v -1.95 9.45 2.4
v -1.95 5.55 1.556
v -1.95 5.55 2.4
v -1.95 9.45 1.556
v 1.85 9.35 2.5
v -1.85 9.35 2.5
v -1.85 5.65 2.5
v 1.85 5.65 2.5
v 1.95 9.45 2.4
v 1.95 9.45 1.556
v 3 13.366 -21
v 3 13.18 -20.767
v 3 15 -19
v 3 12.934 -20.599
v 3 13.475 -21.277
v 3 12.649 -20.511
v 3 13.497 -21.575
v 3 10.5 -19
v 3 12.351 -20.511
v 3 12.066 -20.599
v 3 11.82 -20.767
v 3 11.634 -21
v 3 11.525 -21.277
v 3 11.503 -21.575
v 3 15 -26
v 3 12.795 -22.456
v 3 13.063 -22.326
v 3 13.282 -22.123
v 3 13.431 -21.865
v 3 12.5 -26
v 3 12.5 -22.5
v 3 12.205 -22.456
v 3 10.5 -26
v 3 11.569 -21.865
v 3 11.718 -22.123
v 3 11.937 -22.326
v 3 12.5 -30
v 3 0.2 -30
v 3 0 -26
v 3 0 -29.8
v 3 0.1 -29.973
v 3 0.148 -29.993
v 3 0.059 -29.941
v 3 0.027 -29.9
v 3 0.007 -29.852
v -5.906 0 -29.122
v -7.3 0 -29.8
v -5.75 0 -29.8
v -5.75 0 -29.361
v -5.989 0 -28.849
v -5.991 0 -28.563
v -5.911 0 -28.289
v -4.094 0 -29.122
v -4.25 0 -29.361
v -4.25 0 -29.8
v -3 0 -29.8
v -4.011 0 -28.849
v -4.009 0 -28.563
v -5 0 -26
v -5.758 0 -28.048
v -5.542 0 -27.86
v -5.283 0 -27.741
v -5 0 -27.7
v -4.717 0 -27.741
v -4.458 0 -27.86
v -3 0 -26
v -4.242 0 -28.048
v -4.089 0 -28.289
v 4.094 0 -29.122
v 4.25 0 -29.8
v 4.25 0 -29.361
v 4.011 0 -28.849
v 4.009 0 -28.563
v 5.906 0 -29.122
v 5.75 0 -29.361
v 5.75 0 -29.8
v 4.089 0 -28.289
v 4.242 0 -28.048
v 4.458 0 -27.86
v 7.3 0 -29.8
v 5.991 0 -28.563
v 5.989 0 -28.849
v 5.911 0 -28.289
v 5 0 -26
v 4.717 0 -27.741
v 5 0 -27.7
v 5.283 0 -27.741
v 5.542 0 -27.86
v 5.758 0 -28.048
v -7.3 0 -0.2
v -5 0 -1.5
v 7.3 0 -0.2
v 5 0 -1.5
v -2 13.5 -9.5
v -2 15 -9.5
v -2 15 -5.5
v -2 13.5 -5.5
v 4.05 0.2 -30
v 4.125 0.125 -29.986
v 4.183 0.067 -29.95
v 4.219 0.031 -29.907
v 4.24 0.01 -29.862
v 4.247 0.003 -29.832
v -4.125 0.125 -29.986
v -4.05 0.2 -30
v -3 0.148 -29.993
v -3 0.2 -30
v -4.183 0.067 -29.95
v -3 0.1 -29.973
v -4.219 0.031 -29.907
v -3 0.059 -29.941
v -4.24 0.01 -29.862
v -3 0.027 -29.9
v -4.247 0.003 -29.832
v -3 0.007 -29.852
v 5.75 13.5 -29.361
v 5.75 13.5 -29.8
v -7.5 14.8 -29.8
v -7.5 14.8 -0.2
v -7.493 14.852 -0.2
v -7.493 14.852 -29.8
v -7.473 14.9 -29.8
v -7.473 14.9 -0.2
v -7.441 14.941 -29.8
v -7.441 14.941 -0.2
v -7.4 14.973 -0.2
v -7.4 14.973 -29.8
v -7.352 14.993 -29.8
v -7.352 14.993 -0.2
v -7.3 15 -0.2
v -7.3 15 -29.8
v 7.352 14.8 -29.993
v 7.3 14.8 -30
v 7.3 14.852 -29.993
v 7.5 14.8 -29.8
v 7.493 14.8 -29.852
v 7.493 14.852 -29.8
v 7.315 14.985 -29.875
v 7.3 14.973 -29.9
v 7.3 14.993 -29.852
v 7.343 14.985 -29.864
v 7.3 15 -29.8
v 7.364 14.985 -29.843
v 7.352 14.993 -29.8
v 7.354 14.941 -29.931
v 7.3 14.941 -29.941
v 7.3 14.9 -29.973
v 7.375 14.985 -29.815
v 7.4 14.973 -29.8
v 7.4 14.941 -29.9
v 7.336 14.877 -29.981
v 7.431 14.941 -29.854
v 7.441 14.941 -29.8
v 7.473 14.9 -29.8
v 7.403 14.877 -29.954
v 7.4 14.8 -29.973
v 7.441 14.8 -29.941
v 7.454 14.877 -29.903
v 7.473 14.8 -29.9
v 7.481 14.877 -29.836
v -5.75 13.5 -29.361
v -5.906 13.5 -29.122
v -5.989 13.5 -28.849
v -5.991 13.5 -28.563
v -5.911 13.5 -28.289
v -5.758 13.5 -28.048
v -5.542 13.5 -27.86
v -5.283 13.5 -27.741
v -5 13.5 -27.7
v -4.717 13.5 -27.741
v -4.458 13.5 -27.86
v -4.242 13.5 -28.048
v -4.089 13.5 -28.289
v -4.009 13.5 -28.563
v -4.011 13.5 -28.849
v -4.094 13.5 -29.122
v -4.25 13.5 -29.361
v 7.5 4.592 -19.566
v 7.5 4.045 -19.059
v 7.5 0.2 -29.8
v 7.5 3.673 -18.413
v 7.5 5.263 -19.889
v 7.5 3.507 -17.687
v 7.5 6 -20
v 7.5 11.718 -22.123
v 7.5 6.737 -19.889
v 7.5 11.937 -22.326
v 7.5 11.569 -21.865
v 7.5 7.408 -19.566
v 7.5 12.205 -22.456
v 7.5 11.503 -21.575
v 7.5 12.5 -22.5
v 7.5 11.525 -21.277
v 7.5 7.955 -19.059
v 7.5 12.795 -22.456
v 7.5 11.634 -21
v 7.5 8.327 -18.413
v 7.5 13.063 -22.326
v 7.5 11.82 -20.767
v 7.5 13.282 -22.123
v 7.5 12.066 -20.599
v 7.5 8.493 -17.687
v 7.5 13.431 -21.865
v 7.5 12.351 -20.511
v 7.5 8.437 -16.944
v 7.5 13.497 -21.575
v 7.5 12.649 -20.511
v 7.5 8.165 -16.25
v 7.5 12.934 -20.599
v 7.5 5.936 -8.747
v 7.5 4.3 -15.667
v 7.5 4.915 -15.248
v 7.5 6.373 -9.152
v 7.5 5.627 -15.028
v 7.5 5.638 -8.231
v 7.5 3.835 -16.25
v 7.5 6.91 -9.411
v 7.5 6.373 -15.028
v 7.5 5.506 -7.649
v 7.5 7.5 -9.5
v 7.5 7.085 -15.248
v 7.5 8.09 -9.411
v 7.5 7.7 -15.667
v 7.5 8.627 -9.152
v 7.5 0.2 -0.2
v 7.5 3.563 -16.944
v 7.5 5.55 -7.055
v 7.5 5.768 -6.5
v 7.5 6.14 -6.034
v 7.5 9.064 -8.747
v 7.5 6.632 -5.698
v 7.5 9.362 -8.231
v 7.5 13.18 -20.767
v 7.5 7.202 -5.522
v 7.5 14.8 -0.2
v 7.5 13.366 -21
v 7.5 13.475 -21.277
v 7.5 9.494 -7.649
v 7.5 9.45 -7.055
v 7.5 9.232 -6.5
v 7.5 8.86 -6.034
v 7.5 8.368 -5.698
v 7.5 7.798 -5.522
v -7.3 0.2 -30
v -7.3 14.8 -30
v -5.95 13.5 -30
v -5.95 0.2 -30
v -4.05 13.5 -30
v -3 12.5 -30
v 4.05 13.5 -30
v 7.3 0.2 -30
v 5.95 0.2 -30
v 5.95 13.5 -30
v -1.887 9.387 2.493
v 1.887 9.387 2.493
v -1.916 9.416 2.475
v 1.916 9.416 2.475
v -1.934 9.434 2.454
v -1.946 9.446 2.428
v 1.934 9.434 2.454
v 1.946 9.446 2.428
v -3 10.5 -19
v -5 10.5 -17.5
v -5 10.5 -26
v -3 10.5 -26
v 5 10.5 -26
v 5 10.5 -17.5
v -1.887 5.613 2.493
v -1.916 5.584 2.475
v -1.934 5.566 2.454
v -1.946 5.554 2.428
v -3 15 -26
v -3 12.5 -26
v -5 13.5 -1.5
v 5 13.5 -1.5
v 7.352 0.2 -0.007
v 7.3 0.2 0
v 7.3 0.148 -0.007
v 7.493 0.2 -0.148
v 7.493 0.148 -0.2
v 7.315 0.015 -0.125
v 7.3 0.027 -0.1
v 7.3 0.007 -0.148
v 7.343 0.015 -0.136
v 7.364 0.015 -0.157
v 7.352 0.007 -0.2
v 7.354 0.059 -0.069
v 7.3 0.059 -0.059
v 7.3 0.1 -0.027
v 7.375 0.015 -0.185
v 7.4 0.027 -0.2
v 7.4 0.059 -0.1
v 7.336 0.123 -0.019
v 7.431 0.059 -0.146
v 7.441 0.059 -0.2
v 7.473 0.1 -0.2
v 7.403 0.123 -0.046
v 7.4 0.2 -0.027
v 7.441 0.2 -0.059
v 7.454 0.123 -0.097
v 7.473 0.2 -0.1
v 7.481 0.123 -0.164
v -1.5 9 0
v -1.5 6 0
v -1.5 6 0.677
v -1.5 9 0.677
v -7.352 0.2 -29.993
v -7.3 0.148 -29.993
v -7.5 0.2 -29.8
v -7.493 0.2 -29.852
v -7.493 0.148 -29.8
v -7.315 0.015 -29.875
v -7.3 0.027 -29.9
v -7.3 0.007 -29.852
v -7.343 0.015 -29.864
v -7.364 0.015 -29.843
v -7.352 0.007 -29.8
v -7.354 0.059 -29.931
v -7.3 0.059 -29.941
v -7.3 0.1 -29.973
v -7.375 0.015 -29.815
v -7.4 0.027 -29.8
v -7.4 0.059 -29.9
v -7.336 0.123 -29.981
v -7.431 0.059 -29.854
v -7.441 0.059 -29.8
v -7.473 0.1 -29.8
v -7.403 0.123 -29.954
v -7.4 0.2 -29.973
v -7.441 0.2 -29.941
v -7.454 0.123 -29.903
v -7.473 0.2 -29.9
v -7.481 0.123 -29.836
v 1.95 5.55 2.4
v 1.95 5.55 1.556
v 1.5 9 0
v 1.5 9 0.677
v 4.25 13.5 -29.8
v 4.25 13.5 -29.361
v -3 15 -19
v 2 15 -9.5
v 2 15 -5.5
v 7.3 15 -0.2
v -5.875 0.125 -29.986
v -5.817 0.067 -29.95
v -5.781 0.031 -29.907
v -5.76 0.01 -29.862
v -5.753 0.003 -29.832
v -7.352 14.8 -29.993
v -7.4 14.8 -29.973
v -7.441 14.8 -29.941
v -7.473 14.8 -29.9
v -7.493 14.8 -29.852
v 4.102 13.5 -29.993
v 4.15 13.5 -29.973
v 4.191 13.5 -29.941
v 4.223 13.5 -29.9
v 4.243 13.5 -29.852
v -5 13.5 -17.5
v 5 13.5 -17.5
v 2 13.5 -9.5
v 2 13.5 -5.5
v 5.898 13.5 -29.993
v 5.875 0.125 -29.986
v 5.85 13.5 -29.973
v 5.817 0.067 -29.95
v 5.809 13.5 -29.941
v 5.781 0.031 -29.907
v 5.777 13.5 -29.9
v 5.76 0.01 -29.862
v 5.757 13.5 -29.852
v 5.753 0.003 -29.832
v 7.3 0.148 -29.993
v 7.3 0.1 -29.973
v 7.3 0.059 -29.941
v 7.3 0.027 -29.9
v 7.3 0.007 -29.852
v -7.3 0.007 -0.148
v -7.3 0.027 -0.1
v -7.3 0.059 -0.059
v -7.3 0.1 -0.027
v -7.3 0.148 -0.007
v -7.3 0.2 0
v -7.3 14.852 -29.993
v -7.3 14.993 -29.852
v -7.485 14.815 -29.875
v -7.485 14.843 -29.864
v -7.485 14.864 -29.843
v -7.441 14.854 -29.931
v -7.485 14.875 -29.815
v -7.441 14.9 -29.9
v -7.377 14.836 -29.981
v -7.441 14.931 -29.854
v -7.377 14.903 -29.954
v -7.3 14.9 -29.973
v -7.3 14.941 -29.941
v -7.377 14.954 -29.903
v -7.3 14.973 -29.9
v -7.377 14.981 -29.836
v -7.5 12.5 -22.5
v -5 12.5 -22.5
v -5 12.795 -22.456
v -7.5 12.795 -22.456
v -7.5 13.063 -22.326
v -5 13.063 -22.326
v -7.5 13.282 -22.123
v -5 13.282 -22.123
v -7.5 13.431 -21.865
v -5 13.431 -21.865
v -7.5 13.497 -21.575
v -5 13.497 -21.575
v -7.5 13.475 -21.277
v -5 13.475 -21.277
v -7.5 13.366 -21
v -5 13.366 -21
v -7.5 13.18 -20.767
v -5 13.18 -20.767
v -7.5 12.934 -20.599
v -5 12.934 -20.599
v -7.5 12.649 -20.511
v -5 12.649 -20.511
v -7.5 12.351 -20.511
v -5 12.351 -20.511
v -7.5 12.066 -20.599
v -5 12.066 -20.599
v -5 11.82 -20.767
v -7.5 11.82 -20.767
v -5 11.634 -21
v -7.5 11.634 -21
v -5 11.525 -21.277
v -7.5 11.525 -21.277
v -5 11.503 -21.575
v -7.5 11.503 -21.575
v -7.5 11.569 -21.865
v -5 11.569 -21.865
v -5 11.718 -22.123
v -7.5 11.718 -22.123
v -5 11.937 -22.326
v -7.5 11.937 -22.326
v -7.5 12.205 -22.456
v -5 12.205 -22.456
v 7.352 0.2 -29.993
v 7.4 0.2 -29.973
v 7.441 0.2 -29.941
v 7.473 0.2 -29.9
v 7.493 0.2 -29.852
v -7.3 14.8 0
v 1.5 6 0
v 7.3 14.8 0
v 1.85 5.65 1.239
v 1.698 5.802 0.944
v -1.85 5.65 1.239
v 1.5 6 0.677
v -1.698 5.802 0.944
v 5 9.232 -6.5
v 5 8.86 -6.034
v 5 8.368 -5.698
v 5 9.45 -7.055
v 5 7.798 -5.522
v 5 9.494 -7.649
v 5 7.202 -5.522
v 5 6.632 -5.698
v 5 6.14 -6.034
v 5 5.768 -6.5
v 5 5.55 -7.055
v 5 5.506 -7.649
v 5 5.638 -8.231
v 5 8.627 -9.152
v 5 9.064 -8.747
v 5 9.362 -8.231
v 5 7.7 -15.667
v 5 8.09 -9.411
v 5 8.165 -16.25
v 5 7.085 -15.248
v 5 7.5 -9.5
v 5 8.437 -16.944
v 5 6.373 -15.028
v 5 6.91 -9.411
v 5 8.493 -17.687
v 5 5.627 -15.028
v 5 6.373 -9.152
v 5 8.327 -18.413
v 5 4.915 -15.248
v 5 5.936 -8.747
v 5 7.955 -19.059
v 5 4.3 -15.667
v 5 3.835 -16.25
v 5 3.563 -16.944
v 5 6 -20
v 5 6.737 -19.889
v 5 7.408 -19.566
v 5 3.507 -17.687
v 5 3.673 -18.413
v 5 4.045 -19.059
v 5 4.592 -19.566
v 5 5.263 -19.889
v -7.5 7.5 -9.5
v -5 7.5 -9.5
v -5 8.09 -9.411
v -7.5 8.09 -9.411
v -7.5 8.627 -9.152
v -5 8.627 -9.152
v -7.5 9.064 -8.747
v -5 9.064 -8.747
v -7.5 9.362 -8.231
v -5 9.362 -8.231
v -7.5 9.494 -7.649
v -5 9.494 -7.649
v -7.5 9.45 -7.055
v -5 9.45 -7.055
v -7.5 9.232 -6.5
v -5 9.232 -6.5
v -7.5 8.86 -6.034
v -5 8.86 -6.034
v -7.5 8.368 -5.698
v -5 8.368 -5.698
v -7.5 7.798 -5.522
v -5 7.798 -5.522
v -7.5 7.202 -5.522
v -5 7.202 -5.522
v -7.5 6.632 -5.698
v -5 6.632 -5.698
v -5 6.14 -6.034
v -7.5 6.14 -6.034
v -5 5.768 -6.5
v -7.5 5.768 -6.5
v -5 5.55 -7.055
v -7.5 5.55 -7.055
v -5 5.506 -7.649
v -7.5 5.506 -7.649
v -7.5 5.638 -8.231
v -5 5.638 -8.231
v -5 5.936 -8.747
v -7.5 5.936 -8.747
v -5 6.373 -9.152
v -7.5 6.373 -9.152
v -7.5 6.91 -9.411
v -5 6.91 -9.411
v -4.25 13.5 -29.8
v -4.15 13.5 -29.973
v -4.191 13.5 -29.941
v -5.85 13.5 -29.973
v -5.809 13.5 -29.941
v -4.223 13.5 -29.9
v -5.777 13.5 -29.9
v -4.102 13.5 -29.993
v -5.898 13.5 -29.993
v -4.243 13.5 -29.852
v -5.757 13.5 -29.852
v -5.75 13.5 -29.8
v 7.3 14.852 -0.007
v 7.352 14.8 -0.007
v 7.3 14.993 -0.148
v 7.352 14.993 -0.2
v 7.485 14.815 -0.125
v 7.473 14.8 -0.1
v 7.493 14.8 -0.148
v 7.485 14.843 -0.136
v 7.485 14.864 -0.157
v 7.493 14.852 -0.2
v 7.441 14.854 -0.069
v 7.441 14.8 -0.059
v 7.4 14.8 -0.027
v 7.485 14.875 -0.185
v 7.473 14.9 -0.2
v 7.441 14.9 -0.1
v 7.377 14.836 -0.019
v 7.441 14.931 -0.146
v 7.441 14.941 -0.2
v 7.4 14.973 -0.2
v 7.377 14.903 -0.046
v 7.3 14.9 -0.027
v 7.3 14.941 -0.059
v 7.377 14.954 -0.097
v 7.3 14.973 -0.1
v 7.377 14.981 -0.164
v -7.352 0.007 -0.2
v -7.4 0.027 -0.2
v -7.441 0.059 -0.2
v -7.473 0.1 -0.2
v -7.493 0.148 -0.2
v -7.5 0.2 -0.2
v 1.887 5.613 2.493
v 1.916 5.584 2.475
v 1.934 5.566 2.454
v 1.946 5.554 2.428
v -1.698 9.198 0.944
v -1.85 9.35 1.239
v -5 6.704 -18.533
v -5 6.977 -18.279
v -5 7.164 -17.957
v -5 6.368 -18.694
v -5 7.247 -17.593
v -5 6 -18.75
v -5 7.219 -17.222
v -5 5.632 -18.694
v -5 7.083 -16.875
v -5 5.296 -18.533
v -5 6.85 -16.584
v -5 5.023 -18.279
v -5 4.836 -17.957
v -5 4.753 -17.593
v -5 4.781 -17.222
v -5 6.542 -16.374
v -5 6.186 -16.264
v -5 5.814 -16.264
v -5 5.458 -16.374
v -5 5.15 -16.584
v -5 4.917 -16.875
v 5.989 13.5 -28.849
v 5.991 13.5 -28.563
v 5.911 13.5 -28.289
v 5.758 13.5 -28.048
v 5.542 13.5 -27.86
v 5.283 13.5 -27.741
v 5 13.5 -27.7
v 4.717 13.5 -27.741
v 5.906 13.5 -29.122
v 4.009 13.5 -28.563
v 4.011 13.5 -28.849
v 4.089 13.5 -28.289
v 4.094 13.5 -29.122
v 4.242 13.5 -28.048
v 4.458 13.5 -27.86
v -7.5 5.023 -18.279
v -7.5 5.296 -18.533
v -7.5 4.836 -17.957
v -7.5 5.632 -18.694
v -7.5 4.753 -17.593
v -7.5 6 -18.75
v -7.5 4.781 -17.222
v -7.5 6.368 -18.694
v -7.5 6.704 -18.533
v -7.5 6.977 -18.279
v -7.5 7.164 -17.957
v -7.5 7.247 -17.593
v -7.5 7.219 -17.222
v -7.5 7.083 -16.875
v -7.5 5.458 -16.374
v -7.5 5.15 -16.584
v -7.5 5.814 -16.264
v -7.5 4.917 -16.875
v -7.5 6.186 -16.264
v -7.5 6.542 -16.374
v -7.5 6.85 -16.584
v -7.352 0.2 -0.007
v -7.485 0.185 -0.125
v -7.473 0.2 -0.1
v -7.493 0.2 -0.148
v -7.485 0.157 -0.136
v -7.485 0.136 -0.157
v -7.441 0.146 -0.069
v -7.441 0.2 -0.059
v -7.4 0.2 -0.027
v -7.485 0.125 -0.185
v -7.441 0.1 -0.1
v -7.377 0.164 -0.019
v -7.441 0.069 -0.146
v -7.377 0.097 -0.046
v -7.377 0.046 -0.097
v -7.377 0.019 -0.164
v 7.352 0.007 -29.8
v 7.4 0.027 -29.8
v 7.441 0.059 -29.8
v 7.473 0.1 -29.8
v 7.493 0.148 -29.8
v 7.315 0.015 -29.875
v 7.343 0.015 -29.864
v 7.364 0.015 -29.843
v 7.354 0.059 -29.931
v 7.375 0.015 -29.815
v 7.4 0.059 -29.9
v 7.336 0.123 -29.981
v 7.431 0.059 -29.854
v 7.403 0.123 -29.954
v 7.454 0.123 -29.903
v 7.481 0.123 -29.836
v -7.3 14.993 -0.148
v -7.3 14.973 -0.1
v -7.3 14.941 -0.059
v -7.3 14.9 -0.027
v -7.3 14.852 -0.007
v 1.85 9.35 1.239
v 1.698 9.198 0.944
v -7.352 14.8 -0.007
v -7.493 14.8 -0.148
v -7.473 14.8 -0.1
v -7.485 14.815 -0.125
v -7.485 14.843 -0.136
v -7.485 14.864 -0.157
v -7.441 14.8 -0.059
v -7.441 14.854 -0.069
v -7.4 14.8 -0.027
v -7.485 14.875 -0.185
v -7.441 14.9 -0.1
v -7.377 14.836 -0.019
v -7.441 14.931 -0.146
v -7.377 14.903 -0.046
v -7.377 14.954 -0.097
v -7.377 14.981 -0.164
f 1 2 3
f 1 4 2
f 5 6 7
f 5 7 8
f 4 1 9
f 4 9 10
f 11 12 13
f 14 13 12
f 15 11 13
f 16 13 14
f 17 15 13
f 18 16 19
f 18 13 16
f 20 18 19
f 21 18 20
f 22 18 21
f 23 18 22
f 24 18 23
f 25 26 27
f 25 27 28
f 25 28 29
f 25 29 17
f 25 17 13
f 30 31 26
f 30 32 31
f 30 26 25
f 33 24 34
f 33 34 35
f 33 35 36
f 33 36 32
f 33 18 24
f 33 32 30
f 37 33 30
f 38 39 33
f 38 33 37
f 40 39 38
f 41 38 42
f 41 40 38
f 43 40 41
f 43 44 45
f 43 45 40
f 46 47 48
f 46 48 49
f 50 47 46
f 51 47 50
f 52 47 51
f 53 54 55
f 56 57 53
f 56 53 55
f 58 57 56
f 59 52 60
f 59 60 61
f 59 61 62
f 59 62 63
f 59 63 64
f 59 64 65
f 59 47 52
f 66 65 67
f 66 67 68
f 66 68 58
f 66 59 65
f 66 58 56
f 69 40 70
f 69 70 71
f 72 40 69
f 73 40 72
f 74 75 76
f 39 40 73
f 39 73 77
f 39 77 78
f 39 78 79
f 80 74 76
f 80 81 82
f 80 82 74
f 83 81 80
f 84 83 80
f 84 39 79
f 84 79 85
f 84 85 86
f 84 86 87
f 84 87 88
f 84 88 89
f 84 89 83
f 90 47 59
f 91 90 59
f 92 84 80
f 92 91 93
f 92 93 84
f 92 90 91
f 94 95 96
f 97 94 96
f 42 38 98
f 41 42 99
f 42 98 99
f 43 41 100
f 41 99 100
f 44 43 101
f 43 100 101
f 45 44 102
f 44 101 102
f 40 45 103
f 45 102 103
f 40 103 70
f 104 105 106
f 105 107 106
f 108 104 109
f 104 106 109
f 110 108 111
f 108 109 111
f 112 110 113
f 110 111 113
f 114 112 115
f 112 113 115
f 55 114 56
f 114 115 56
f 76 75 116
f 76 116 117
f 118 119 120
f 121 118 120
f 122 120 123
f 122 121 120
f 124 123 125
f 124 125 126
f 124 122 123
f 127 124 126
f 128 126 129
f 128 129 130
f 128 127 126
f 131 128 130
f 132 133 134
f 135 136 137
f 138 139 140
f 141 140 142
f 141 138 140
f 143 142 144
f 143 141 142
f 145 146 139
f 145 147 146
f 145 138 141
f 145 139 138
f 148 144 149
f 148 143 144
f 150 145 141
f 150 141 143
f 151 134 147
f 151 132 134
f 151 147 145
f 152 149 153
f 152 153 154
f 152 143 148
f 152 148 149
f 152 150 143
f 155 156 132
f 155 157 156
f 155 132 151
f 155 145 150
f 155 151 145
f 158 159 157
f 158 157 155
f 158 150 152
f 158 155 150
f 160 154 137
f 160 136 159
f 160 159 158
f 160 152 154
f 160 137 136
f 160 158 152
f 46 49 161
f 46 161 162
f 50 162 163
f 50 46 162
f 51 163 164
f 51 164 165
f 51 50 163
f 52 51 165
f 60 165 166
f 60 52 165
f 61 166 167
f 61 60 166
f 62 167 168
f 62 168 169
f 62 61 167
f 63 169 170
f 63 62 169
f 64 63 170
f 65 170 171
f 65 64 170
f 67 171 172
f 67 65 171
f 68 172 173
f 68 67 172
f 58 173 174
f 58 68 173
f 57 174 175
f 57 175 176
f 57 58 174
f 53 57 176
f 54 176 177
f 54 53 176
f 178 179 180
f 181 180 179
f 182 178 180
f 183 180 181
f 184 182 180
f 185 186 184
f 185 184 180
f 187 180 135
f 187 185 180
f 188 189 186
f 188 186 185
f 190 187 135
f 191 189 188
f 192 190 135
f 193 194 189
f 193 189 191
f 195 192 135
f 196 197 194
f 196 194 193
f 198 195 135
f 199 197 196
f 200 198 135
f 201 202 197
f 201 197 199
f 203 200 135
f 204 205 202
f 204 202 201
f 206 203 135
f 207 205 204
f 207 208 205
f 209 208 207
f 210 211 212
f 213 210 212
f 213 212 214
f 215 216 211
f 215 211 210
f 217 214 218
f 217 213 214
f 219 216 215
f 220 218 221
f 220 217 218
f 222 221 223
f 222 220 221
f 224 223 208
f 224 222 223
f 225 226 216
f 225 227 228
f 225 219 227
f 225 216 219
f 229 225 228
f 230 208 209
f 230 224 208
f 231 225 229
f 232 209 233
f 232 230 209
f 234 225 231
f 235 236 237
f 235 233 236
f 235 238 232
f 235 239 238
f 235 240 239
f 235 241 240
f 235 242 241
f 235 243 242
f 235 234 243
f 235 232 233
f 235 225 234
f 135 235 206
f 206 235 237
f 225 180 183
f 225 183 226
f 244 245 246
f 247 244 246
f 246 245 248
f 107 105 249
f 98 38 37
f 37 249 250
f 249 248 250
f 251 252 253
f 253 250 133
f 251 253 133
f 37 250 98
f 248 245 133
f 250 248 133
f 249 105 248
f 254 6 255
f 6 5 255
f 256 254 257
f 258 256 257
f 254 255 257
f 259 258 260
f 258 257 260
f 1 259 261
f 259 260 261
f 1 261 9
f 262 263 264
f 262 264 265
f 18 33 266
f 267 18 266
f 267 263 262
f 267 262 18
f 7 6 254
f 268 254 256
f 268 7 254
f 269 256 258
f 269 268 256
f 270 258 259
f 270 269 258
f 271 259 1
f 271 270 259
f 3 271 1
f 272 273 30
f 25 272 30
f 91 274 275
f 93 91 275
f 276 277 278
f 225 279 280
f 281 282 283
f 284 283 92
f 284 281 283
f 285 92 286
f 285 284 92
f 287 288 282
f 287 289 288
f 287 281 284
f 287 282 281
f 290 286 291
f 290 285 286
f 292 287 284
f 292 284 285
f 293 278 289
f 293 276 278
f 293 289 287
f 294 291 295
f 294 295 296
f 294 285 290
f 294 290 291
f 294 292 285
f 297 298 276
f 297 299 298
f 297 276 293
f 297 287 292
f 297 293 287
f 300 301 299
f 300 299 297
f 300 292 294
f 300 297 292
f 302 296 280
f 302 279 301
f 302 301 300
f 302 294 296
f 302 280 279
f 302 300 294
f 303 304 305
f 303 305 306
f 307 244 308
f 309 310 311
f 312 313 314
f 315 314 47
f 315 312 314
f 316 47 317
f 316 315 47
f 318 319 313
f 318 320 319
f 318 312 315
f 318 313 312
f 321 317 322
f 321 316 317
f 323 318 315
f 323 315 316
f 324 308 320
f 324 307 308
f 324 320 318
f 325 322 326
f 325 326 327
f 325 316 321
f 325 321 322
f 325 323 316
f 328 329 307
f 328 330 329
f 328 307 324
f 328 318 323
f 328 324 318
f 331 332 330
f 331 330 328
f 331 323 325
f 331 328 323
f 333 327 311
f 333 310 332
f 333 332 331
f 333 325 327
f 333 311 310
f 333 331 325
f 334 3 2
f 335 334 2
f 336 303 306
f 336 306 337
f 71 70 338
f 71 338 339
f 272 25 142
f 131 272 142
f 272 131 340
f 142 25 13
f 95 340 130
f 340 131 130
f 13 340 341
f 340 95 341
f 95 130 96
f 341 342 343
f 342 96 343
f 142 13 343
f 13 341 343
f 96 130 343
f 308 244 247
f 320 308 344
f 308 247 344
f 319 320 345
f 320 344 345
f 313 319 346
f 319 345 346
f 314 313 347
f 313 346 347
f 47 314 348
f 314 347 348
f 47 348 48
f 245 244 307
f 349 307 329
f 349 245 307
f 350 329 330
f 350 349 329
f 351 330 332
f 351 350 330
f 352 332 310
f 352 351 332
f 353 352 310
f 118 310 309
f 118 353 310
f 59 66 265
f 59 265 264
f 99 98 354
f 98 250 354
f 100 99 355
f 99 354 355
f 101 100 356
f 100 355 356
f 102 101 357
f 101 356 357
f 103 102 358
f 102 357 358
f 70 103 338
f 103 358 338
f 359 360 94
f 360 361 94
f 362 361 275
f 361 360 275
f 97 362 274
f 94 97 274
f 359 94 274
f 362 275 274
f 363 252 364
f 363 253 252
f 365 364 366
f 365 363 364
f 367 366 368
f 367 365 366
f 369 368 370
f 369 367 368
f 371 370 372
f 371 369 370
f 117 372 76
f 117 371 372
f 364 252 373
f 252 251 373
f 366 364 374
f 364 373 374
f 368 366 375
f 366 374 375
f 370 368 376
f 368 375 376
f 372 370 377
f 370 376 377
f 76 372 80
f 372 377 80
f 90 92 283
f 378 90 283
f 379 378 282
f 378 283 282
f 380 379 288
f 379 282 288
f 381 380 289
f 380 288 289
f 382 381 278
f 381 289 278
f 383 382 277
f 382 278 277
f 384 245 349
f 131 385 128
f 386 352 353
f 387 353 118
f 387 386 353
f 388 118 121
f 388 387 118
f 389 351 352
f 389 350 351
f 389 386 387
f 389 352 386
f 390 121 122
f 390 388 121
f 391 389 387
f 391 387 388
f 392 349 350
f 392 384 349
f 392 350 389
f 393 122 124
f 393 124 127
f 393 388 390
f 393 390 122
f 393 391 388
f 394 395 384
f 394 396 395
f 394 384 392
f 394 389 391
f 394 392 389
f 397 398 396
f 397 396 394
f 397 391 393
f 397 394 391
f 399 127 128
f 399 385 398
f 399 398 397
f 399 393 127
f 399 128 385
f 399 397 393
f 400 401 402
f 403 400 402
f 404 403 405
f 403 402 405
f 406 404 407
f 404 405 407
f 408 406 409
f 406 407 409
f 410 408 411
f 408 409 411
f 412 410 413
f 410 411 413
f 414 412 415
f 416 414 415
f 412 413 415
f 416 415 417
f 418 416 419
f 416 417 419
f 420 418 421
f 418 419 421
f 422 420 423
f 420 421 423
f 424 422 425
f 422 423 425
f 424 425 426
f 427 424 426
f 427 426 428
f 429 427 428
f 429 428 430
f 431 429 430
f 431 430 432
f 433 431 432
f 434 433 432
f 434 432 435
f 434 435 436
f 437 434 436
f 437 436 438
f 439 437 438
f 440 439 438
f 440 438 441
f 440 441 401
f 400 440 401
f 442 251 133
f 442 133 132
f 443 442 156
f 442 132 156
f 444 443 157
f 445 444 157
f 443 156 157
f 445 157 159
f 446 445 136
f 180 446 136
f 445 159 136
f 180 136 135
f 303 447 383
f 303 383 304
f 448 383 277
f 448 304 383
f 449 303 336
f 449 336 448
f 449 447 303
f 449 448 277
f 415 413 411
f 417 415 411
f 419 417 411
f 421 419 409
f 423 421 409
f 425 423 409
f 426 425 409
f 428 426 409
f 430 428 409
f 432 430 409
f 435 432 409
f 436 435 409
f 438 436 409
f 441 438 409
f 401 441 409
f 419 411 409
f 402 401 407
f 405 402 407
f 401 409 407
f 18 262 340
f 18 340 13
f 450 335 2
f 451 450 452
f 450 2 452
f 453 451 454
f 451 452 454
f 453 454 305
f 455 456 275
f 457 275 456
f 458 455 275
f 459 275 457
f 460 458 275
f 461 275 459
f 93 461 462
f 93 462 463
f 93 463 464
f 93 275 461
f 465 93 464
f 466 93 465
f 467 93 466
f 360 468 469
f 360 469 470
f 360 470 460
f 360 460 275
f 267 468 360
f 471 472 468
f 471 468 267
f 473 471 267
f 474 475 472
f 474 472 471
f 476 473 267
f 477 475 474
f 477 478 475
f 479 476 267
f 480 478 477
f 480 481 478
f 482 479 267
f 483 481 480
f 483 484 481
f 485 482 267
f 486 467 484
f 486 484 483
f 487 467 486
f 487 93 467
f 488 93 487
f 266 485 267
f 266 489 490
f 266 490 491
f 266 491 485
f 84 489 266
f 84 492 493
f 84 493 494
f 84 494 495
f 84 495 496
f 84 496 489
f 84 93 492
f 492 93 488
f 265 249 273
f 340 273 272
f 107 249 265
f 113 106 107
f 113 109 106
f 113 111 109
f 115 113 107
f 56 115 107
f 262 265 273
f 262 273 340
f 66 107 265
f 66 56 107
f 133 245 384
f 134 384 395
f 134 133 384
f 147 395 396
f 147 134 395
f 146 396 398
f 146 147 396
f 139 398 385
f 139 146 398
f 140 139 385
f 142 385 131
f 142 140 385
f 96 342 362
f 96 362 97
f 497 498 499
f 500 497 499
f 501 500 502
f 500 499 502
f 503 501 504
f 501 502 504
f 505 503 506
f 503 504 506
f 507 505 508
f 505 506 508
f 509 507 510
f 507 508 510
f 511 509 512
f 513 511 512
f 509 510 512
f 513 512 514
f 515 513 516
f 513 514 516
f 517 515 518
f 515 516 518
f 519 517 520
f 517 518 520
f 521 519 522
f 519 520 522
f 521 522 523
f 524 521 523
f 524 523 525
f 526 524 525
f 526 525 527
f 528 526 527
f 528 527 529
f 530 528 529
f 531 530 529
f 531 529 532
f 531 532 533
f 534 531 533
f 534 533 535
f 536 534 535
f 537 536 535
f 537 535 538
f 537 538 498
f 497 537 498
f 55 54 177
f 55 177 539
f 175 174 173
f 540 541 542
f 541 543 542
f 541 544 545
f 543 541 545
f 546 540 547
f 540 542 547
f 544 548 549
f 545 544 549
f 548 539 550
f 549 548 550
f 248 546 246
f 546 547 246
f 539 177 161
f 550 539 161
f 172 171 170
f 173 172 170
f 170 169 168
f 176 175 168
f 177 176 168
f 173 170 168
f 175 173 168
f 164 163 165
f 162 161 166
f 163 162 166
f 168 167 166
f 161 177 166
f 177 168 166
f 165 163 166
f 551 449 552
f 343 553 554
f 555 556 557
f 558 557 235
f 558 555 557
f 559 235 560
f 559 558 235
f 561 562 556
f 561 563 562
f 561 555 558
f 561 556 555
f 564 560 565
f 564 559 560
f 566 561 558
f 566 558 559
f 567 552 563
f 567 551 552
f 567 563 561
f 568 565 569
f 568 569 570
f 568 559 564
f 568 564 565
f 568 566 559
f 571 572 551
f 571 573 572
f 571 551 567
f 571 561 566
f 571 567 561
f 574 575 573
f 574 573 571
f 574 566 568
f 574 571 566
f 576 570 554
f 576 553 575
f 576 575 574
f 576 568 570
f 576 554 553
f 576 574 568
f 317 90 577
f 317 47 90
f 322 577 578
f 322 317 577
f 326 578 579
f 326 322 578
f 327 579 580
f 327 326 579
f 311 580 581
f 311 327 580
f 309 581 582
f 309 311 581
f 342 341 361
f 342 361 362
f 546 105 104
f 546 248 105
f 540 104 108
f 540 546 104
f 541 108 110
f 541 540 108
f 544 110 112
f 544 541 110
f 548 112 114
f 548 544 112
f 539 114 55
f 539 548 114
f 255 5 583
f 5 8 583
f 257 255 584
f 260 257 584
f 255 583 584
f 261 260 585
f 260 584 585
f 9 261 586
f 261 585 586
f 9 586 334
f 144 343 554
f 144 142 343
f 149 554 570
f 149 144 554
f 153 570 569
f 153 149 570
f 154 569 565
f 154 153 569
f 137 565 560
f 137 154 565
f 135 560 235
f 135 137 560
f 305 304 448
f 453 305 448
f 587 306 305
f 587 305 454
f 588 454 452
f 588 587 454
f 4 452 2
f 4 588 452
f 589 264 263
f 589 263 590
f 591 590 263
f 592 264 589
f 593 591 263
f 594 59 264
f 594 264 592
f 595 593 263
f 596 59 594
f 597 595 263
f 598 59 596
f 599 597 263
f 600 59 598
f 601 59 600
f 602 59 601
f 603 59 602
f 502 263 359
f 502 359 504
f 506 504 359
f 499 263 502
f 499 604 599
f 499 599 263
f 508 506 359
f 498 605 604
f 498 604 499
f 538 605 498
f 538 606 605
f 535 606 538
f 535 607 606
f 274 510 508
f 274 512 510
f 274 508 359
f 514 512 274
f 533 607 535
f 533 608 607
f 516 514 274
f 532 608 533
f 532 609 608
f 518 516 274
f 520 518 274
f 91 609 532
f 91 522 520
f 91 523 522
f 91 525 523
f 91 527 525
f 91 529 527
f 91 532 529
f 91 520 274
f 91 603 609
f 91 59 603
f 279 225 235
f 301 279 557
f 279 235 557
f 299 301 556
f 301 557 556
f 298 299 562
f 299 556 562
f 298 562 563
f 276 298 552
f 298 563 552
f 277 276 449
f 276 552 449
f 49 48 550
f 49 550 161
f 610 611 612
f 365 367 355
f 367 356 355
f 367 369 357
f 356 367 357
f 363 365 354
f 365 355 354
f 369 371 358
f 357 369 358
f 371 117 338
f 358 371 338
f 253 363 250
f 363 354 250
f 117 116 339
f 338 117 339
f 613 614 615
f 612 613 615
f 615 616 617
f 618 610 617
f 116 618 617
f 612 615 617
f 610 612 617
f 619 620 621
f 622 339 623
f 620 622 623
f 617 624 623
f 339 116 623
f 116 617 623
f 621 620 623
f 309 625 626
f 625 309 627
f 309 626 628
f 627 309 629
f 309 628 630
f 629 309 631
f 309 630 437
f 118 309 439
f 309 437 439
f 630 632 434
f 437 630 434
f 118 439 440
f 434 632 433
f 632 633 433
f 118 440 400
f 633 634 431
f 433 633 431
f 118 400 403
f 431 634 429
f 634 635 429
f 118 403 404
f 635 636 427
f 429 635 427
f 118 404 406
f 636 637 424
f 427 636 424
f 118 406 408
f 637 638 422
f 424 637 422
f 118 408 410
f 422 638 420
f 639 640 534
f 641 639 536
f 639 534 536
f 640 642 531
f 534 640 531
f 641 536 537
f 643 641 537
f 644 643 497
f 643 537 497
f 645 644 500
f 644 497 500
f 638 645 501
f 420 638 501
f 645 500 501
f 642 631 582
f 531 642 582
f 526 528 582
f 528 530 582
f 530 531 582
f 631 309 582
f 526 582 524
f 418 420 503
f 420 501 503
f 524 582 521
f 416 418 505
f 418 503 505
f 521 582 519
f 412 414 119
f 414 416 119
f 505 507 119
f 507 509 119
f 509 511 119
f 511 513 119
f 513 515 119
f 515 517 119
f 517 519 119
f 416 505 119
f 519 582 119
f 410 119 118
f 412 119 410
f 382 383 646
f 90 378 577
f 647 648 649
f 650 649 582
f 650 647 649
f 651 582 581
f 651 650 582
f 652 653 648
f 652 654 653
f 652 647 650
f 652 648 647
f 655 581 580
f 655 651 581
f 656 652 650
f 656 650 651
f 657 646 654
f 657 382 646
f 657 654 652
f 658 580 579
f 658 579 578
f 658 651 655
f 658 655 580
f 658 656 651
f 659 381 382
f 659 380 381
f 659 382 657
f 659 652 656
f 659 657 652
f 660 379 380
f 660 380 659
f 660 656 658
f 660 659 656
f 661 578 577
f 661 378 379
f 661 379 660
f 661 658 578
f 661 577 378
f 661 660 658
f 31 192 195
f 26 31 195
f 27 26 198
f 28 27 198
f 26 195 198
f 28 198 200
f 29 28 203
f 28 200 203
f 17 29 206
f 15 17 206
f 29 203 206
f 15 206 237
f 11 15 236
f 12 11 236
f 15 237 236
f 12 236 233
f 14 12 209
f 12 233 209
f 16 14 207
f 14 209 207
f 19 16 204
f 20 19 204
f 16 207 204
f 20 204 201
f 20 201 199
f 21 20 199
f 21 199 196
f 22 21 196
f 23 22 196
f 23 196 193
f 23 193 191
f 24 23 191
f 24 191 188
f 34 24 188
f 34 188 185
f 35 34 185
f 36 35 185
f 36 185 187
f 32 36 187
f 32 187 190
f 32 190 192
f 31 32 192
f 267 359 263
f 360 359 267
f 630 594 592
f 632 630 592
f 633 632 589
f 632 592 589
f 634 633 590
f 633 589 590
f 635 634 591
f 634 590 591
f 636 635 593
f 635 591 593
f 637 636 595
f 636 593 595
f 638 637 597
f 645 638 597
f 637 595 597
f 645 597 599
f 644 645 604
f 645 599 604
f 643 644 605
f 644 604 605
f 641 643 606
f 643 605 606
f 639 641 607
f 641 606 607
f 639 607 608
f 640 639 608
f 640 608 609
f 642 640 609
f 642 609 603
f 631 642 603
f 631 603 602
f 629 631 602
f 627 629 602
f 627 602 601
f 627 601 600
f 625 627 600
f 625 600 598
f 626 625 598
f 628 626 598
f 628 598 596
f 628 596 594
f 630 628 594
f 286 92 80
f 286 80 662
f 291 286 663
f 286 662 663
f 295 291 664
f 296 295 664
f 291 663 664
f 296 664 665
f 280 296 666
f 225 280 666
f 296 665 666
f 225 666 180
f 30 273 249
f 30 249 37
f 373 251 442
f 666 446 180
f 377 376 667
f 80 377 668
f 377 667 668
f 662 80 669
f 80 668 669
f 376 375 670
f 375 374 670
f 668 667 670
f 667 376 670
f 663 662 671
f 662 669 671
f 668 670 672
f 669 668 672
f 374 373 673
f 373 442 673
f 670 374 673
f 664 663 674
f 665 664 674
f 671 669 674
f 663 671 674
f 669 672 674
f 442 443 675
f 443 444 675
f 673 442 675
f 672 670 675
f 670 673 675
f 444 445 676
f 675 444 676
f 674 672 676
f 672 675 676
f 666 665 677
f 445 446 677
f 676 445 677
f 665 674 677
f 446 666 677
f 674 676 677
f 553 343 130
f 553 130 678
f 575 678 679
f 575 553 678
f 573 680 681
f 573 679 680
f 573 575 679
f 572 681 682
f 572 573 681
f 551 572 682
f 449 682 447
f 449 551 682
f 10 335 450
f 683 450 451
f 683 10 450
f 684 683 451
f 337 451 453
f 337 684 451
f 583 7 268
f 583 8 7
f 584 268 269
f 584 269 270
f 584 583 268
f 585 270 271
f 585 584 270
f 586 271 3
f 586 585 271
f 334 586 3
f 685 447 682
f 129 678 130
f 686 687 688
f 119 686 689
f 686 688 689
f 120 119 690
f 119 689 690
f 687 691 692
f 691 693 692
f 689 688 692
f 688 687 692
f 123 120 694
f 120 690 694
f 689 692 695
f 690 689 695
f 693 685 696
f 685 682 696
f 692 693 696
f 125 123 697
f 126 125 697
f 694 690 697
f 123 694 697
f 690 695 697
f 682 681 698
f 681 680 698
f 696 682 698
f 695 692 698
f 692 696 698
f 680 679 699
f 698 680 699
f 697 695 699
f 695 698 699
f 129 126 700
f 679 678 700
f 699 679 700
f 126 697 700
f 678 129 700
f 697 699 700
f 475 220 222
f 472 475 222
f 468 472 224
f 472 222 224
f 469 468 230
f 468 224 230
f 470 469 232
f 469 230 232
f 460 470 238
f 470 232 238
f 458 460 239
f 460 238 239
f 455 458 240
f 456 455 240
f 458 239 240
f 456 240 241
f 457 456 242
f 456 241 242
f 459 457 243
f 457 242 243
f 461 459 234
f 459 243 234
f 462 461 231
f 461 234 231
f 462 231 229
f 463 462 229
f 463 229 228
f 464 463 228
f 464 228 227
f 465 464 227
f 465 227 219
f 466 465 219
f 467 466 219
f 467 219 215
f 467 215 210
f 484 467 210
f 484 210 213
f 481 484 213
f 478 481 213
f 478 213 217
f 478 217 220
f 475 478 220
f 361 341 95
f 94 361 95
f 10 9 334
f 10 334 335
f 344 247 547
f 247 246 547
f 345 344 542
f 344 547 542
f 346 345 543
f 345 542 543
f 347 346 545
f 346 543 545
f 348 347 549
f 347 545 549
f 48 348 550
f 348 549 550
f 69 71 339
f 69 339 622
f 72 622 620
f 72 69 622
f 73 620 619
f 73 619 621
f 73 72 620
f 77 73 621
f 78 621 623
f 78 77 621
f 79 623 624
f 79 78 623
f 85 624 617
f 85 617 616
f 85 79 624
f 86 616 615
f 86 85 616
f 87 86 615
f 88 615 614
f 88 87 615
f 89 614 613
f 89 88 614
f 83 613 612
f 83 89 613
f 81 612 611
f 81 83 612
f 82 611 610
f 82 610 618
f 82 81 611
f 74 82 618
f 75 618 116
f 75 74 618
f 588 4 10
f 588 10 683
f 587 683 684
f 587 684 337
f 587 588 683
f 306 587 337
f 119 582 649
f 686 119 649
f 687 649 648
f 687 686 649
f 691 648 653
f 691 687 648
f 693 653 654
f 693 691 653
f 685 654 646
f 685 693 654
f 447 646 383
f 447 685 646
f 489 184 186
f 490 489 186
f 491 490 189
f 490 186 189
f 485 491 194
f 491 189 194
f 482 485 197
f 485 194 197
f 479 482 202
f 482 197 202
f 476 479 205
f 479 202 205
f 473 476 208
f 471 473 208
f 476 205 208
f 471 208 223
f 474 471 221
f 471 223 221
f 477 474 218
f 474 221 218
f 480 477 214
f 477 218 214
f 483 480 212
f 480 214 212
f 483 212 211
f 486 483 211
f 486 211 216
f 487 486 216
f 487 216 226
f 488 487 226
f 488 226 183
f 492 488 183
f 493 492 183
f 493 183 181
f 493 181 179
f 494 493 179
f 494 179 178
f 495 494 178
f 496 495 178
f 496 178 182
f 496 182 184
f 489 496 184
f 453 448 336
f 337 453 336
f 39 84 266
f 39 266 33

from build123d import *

# Parameters (mm, degrees)
SKETCH_1_W           = 15
SKETCH_1_H           = 15
EXTRUDE_1_DEPTH      = 30
SKETCH_2_W           = 3
SKETCH_2_H           = 3
EXTRUDE_2_DEPTH      = 1
EXTRUDE_3_DEPTH      = 1
EXTRUDE_3_DEPTH_BACK = 4
CUT_EXTRUDE_1_REACH  = 36.847
FILLET_1_R           = 0.1
CUT_EXTRUDE_2_DEPTH  = 13.5
SKETCH_6_W           = 10
SKETCH_6_H           = 8.5
EXTRUDE_4_DEPTH      = 3
SKETCH_7_W           = 6
SKETCH_7_H           = 4
EXTRUDE_5_DEPTH      = 1
SKETCH_8_W           = 6
SKETCH_8_H           = 7
CUT_EXTRUDE_3_DEPTH  = 33.657311586
CUT_EXTRUDE_4_DEPTH  = 13.5
CUT_EXTRUDE_5_REACH  = 36.369
SKETCH_11_W          = 4
SKETCH_11_H          = 4
CUT_EXTRUDE_6_REACH  = 38.742
SKETCH_12_R          = 2.5
SKETCH_12_R_2        = 2
SKETCH_12_R_3        = 1
CUT_EXTRUDE_7_REACH  = 37.795
SKETCH_14_R          = 2
SKETCH_14_R_2        = 1
SKETCH_14_R_3        = 1.25
FILLET_2_R           = 0.2


with BuildPart() as part:
    # 草图1 → 凸台-拉伸1 (new body)
    with BuildSketch(Plane.XY):
        with Locations((0, 7.5)):
            Rectangle(SKETCH_1_W, SKETCH_1_H)
    extrude(amount=-EXTRUDE_1_DEPTH)

    # 草图2 → 凸台-拉伸2 (add)
    with BuildSketch(Plane.XY):
        with Locations((0, 7.5)):
            Rectangle(SKETCH_2_W, SKETCH_2_H)
    extrude(amount=EXTRUDE_2_DEPTH)

    # 草图3 → 凸台-拉伸3 (add, two sides: drawn at the far end of the back side and taken through both)
    with BuildSketch(Plane.XZ.offset(-6).offset(-EXTRUDE_3_DEPTH_BACK)):
        with BuildLine():
            Line((-1.95, 2.5), (1.95, 2.5))
            Line((1.95, 2.5), (1.95, 1.555590279))
            ThreePointArc((1.95, 1.555590279), (1.780042303, 1.088161527), (1.5, 0.677124344))
            Line((1.5, 0.677124344), (-1.5, 0.677124344))
            ThreePointArc((-1.5, 0.677124344), (-1.780042303, 1.088161527), (-1.95, 1.555590279))
            Line((-1.95, 1.555590279), (-1.95, 2.5))
        make_face()
    extrude(amount=EXTRUDE_3_DEPTH + EXTRUDE_3_DEPTH_BACK)

    # 草图4 → 切除-拉伸1 (cut, up to next)
    with BuildSketch(Plane.ZY.offset(1.95), mode=Mode.PRIVATE) as cut_extrude_1_sk1:
        with BuildLine():
            Line((2.5, 9.45), (1.555590279, 9.45))
            ThreePointArc((1.555590279, 9.45), (1.088161527, 9.280042303), (0.677124344, 9))
            Line((0.677124344, 9), (0.677124344, 10))
            Line((0.677124344, 10), (2.5, 10))
            Line((2.5, 10), (2.5, 9.45))
        make_face()
    cut_extrude_1_tool1 = extrude(cut_extrude_1_sk1.sketch, amount=-CUT_EXTRUDE_1_REACH, mode=Mode.PRIVATE) & part.part
    # 草图4 → 切除-拉伸1 (cut, up to next)
    with BuildSketch(Plane.ZY.offset(1.95), mode=Mode.PRIVATE) as cut_extrude_1_sk2:
        with BuildLine():
            Line((2.5, 5.55), (1.555590279, 5.55))
            ThreePointArc((1.555590279, 5.55), (1.088161527, 5.719957697), (0.677124344, 6))
            Line((0.677124344, 6), (0.677124344, 5))
            Line((0.677124344, 5), (2.5, 5))
            Line((2.5, 5), (2.5, 5.55))
        make_face()
    cut_extrude_1_tool2 = extrude(cut_extrude_1_sk2.sketch, amount=-CUT_EXTRUDE_1_REACH, mode=Mode.PRIVATE) & part.part
    add(cut_extrude_1_tool1.solids().sort_by_distance((-1.95, 9.669375, 1.500125))[0], mode=Mode.SUBTRACT)
    add(cut_extrude_1_tool2.solids().sort_by_distance((-1.95, 5.330625, 1.500125))[0], mode=Mode.SUBTRACT)

    # 圆角1
    fillet_1_edges = [part.edges().sort_by_distance(p)[0] for p in [
        (1.95, 7.5, 2.5),
        (-1.95, 7.5, 2.5),
        (0, 9.45, 2.5),
        (0, 5.55, 2.5),
    ]]
    fillet(fillet_1_edges, radius=FILLET_1_R)

    # 草图5 → 切除-拉伸2 (cut)
    with BuildSketch(Plane.XZ):
        Polygon((-5, -1.5), (5, -1.5), (5, -26), (3, -26), (3, -30), (-3, -30), (-3, -26), (-5, -26), align=None)
    extrude(amount=-CUT_EXTRUDE_2_DEPTH, mode=Mode.SUBTRACT)

    # 草图6 → 凸台-拉伸4 (add)
    with BuildSketch(Plane.XZ.offset(-13.5)):
        with Locations((0, -21.75)):
            Rectangle(SKETCH_6_W, SKETCH_6_H)
    extrude(amount=EXTRUDE_4_DEPTH)

    # 草图7 → 凸台-拉伸5 (add)
    with BuildSketch(Plane.XZ.offset(-13.5)):
        with Locations((0, -28)):
            Rectangle(SKETCH_7_W, SKETCH_7_H)
    extrude(amount=EXTRUDE_5_DEPTH)

    # 草图8 → 切除-拉伸3 (cut, through all)
    with BuildSketch(Plane.XZ.offset(-10.5)):
        with Locations((0, -22.5)):
            Rectangle(SKETCH_8_W, SKETCH_8_H)
    extrude(amount=-CUT_EXTRUDE_3_DEPTH, mode=Mode.SUBTRACT)

    # 草图10 → 切除-拉伸4 (cut)
    with BuildSketch(Plane.XZ):
        with BuildLine():
            Line((-5.75, -30), (-5.75, -29.361437828))
            ThreePointArc((-5.75, -29.361437828), (-5, -27.7), (-4.25, -29.361437828))
            Line((-4.25, -29.361437828), (-4.25, -30))
            Line((-4.25, -30), (-5.75, -30))
        make_face()
        with BuildLine():
            Line((5.75, -30), (4.25, -30))
            Line((4.25, -30), (4.25, -29.361437828))
            ThreePointArc((4.25, -29.361437828), (5, -27.7), (5.75, -29.361437828))
            Line((5.75, -29.361437828), (5.75, -30))
        make_face()
    extrude(amount=-CUT_EXTRUDE_4_DEPTH, mode=Mode.SUBTRACT)

    # 草图11 → 切除-拉伸5 (cut, up to next)
    with BuildSketch(Plane(origin=(0, 15, 0), x_dir=(-1, 0, 0), z_dir=(0, 1, 0)), mode=Mode.PRIVATE) as cut_extrude_5_sk1:
        with Locations((0, -7.5)):
            Rectangle(SKETCH_11_W, SKETCH_11_H)
    cut_extrude_5_tool1 = extrude(cut_extrude_5_sk1.sketch, amount=-CUT_EXTRUDE_5_REACH, mode=Mode.PRIVATE) & part.part
    add(cut_extrude_5_tool1.solids().sort_by_distance((0, 15, -7.5))[0], mode=Mode.SUBTRACT)

    # 草图12 → 切除-拉伸6 (cut, up to next)
    with BuildSketch(Plane(origin=(7.5, 0, 0), x_dir=(0, 0, -1), z_dir=(1, 0, 0)), mode=Mode.PRIVATE) as cut_extrude_6_sk1:
        with Locations((17.5, 6)):
            Circle(SKETCH_12_R)
    cut_extrude_6_tool1 = extrude(cut_extrude_6_sk1.sketch, amount=-CUT_EXTRUDE_6_REACH, mode=Mode.PRIVATE) & part.part
    # 草图12 → 切除-拉伸6 (cut, up to next)
    with BuildSketch(Plane(origin=(7.5, 0, 0), x_dir=(0, 0, -1), z_dir=(1, 0, 0)), mode=Mode.PRIVATE) as cut_extrude_6_sk2:
        with Locations((7.5, 7.5)):
            Circle(SKETCH_12_R_2)
    cut_extrude_6_tool2 = extrude(cut_extrude_6_sk2.sketch, amount=-CUT_EXTRUDE_6_REACH, mode=Mode.PRIVATE) & part.part
    # 草图12 → 切除-拉伸6 (cut, up to next)
    with BuildSketch(Plane(origin=(7.5, 0, 0), x_dir=(0, 0, -1), z_dir=(1, 0, 0)), mode=Mode.PRIVATE) as cut_extrude_6_sk3:
        with Locations((21.5, 12.5)):
            Circle(SKETCH_12_R_3)
    cut_extrude_6_tool3 = extrude(cut_extrude_6_sk3.sketch, amount=-CUT_EXTRUDE_6_REACH, mode=Mode.PRIVATE) & part.part
    add(cut_extrude_6_tool1.solids().sort_by_distance((7.5, 6, -17.5))[0], mode=Mode.SUBTRACT)
    add(cut_extrude_6_tool2.solids().sort_by_distance((7.5, 7.5, -7.5))[0], mode=Mode.SUBTRACT)
    add(cut_extrude_6_tool3.solids().sort_by_distance((7.5, 12.5, -21.5))[0], mode=Mode.SUBTRACT)

    # 草图14 → 切除-拉伸7 (cut, up to next)
    with BuildSketch(Plane(origin=(-5, 0, 0), x_dir=(0, 0, -1), z_dir=(1, 0, 0)), mode=Mode.PRIVATE) as cut_extrude_7_sk1:
        with Locations((7.5, 7.5)):
            Circle(SKETCH_14_R)
    cut_extrude_7_tool1 = extrude(cut_extrude_7_sk1.sketch, amount=-CUT_EXTRUDE_7_REACH, mode=Mode.PRIVATE) & part.part
    # 草图14 → 切除-拉伸7 (cut, up to next)
    with BuildSketch(Plane(origin=(-5, 0, 0), x_dir=(0, 0, -1), z_dir=(1, 0, 0)), mode=Mode.PRIVATE) as cut_extrude_7_sk2:
        with Locations((21.5, 12.5)):
            Circle(SKETCH_14_R_2)
    cut_extrude_7_tool2 = extrude(cut_extrude_7_sk2.sketch, amount=-CUT_EXTRUDE_7_REACH, mode=Mode.PRIVATE) & part.part
    # 草图14 → 切除-拉伸7 (cut, up to next)
    with BuildSketch(Plane(origin=(-5, 0, 0), x_dir=(0, 0, -1), z_dir=(1, 0, 0)), mode=Mode.PRIVATE) as cut_extrude_7_sk3:
        with Locations((17.5, 6)):
            Circle(SKETCH_14_R_3)
    cut_extrude_7_tool3 = extrude(cut_extrude_7_sk3.sketch, amount=-CUT_EXTRUDE_7_REACH, mode=Mode.PRIVATE) & part.part
    add(cut_extrude_7_tool1.solids().sort_by_distance((-5, 7.5, -7.5))[0], mode=Mode.SUBTRACT)
    add(cut_extrude_7_tool2.solids().sort_by_distance((-5, 12.5, -21.5))[0], mode=Mode.SUBTRACT)
    add(cut_extrude_7_tool3.solids().sort_by_distance((-5, 6, -17.5))[0], mode=Mode.SUBTRACT)

    # 圆角2
    fillet_2_edges = [part.edges().sort_by_distance(p)[0] for p in [
        (7.5, 7.5, -30),
        (0, 15, -30),
        (-3.625, 0, -30),
        (-4.25, 6.75, -30),
        (-5.75, 6.75, -30),
        (6.625, 0, -30),
        (5.75, 6.75, -30),
        (4.25, 6.75, -30),
        (-7.5, 7.5, -30),
        (0, 15, 0),
        (7.5, 7.5, 0),
        (0, 0, 0),
        (-7.5, 7.5, 0),
        (-6.625, 0, -30),
        (-7.5, 15, -15),
        (7.5, 15, -15),
        (7.5, 0, -15),
        (-7.5, 0, -15),
        (3.625, 0, -30),
    ]]
    fillet(fillet_2_edges, radius=FILLET_2_R)


solid = part.part
